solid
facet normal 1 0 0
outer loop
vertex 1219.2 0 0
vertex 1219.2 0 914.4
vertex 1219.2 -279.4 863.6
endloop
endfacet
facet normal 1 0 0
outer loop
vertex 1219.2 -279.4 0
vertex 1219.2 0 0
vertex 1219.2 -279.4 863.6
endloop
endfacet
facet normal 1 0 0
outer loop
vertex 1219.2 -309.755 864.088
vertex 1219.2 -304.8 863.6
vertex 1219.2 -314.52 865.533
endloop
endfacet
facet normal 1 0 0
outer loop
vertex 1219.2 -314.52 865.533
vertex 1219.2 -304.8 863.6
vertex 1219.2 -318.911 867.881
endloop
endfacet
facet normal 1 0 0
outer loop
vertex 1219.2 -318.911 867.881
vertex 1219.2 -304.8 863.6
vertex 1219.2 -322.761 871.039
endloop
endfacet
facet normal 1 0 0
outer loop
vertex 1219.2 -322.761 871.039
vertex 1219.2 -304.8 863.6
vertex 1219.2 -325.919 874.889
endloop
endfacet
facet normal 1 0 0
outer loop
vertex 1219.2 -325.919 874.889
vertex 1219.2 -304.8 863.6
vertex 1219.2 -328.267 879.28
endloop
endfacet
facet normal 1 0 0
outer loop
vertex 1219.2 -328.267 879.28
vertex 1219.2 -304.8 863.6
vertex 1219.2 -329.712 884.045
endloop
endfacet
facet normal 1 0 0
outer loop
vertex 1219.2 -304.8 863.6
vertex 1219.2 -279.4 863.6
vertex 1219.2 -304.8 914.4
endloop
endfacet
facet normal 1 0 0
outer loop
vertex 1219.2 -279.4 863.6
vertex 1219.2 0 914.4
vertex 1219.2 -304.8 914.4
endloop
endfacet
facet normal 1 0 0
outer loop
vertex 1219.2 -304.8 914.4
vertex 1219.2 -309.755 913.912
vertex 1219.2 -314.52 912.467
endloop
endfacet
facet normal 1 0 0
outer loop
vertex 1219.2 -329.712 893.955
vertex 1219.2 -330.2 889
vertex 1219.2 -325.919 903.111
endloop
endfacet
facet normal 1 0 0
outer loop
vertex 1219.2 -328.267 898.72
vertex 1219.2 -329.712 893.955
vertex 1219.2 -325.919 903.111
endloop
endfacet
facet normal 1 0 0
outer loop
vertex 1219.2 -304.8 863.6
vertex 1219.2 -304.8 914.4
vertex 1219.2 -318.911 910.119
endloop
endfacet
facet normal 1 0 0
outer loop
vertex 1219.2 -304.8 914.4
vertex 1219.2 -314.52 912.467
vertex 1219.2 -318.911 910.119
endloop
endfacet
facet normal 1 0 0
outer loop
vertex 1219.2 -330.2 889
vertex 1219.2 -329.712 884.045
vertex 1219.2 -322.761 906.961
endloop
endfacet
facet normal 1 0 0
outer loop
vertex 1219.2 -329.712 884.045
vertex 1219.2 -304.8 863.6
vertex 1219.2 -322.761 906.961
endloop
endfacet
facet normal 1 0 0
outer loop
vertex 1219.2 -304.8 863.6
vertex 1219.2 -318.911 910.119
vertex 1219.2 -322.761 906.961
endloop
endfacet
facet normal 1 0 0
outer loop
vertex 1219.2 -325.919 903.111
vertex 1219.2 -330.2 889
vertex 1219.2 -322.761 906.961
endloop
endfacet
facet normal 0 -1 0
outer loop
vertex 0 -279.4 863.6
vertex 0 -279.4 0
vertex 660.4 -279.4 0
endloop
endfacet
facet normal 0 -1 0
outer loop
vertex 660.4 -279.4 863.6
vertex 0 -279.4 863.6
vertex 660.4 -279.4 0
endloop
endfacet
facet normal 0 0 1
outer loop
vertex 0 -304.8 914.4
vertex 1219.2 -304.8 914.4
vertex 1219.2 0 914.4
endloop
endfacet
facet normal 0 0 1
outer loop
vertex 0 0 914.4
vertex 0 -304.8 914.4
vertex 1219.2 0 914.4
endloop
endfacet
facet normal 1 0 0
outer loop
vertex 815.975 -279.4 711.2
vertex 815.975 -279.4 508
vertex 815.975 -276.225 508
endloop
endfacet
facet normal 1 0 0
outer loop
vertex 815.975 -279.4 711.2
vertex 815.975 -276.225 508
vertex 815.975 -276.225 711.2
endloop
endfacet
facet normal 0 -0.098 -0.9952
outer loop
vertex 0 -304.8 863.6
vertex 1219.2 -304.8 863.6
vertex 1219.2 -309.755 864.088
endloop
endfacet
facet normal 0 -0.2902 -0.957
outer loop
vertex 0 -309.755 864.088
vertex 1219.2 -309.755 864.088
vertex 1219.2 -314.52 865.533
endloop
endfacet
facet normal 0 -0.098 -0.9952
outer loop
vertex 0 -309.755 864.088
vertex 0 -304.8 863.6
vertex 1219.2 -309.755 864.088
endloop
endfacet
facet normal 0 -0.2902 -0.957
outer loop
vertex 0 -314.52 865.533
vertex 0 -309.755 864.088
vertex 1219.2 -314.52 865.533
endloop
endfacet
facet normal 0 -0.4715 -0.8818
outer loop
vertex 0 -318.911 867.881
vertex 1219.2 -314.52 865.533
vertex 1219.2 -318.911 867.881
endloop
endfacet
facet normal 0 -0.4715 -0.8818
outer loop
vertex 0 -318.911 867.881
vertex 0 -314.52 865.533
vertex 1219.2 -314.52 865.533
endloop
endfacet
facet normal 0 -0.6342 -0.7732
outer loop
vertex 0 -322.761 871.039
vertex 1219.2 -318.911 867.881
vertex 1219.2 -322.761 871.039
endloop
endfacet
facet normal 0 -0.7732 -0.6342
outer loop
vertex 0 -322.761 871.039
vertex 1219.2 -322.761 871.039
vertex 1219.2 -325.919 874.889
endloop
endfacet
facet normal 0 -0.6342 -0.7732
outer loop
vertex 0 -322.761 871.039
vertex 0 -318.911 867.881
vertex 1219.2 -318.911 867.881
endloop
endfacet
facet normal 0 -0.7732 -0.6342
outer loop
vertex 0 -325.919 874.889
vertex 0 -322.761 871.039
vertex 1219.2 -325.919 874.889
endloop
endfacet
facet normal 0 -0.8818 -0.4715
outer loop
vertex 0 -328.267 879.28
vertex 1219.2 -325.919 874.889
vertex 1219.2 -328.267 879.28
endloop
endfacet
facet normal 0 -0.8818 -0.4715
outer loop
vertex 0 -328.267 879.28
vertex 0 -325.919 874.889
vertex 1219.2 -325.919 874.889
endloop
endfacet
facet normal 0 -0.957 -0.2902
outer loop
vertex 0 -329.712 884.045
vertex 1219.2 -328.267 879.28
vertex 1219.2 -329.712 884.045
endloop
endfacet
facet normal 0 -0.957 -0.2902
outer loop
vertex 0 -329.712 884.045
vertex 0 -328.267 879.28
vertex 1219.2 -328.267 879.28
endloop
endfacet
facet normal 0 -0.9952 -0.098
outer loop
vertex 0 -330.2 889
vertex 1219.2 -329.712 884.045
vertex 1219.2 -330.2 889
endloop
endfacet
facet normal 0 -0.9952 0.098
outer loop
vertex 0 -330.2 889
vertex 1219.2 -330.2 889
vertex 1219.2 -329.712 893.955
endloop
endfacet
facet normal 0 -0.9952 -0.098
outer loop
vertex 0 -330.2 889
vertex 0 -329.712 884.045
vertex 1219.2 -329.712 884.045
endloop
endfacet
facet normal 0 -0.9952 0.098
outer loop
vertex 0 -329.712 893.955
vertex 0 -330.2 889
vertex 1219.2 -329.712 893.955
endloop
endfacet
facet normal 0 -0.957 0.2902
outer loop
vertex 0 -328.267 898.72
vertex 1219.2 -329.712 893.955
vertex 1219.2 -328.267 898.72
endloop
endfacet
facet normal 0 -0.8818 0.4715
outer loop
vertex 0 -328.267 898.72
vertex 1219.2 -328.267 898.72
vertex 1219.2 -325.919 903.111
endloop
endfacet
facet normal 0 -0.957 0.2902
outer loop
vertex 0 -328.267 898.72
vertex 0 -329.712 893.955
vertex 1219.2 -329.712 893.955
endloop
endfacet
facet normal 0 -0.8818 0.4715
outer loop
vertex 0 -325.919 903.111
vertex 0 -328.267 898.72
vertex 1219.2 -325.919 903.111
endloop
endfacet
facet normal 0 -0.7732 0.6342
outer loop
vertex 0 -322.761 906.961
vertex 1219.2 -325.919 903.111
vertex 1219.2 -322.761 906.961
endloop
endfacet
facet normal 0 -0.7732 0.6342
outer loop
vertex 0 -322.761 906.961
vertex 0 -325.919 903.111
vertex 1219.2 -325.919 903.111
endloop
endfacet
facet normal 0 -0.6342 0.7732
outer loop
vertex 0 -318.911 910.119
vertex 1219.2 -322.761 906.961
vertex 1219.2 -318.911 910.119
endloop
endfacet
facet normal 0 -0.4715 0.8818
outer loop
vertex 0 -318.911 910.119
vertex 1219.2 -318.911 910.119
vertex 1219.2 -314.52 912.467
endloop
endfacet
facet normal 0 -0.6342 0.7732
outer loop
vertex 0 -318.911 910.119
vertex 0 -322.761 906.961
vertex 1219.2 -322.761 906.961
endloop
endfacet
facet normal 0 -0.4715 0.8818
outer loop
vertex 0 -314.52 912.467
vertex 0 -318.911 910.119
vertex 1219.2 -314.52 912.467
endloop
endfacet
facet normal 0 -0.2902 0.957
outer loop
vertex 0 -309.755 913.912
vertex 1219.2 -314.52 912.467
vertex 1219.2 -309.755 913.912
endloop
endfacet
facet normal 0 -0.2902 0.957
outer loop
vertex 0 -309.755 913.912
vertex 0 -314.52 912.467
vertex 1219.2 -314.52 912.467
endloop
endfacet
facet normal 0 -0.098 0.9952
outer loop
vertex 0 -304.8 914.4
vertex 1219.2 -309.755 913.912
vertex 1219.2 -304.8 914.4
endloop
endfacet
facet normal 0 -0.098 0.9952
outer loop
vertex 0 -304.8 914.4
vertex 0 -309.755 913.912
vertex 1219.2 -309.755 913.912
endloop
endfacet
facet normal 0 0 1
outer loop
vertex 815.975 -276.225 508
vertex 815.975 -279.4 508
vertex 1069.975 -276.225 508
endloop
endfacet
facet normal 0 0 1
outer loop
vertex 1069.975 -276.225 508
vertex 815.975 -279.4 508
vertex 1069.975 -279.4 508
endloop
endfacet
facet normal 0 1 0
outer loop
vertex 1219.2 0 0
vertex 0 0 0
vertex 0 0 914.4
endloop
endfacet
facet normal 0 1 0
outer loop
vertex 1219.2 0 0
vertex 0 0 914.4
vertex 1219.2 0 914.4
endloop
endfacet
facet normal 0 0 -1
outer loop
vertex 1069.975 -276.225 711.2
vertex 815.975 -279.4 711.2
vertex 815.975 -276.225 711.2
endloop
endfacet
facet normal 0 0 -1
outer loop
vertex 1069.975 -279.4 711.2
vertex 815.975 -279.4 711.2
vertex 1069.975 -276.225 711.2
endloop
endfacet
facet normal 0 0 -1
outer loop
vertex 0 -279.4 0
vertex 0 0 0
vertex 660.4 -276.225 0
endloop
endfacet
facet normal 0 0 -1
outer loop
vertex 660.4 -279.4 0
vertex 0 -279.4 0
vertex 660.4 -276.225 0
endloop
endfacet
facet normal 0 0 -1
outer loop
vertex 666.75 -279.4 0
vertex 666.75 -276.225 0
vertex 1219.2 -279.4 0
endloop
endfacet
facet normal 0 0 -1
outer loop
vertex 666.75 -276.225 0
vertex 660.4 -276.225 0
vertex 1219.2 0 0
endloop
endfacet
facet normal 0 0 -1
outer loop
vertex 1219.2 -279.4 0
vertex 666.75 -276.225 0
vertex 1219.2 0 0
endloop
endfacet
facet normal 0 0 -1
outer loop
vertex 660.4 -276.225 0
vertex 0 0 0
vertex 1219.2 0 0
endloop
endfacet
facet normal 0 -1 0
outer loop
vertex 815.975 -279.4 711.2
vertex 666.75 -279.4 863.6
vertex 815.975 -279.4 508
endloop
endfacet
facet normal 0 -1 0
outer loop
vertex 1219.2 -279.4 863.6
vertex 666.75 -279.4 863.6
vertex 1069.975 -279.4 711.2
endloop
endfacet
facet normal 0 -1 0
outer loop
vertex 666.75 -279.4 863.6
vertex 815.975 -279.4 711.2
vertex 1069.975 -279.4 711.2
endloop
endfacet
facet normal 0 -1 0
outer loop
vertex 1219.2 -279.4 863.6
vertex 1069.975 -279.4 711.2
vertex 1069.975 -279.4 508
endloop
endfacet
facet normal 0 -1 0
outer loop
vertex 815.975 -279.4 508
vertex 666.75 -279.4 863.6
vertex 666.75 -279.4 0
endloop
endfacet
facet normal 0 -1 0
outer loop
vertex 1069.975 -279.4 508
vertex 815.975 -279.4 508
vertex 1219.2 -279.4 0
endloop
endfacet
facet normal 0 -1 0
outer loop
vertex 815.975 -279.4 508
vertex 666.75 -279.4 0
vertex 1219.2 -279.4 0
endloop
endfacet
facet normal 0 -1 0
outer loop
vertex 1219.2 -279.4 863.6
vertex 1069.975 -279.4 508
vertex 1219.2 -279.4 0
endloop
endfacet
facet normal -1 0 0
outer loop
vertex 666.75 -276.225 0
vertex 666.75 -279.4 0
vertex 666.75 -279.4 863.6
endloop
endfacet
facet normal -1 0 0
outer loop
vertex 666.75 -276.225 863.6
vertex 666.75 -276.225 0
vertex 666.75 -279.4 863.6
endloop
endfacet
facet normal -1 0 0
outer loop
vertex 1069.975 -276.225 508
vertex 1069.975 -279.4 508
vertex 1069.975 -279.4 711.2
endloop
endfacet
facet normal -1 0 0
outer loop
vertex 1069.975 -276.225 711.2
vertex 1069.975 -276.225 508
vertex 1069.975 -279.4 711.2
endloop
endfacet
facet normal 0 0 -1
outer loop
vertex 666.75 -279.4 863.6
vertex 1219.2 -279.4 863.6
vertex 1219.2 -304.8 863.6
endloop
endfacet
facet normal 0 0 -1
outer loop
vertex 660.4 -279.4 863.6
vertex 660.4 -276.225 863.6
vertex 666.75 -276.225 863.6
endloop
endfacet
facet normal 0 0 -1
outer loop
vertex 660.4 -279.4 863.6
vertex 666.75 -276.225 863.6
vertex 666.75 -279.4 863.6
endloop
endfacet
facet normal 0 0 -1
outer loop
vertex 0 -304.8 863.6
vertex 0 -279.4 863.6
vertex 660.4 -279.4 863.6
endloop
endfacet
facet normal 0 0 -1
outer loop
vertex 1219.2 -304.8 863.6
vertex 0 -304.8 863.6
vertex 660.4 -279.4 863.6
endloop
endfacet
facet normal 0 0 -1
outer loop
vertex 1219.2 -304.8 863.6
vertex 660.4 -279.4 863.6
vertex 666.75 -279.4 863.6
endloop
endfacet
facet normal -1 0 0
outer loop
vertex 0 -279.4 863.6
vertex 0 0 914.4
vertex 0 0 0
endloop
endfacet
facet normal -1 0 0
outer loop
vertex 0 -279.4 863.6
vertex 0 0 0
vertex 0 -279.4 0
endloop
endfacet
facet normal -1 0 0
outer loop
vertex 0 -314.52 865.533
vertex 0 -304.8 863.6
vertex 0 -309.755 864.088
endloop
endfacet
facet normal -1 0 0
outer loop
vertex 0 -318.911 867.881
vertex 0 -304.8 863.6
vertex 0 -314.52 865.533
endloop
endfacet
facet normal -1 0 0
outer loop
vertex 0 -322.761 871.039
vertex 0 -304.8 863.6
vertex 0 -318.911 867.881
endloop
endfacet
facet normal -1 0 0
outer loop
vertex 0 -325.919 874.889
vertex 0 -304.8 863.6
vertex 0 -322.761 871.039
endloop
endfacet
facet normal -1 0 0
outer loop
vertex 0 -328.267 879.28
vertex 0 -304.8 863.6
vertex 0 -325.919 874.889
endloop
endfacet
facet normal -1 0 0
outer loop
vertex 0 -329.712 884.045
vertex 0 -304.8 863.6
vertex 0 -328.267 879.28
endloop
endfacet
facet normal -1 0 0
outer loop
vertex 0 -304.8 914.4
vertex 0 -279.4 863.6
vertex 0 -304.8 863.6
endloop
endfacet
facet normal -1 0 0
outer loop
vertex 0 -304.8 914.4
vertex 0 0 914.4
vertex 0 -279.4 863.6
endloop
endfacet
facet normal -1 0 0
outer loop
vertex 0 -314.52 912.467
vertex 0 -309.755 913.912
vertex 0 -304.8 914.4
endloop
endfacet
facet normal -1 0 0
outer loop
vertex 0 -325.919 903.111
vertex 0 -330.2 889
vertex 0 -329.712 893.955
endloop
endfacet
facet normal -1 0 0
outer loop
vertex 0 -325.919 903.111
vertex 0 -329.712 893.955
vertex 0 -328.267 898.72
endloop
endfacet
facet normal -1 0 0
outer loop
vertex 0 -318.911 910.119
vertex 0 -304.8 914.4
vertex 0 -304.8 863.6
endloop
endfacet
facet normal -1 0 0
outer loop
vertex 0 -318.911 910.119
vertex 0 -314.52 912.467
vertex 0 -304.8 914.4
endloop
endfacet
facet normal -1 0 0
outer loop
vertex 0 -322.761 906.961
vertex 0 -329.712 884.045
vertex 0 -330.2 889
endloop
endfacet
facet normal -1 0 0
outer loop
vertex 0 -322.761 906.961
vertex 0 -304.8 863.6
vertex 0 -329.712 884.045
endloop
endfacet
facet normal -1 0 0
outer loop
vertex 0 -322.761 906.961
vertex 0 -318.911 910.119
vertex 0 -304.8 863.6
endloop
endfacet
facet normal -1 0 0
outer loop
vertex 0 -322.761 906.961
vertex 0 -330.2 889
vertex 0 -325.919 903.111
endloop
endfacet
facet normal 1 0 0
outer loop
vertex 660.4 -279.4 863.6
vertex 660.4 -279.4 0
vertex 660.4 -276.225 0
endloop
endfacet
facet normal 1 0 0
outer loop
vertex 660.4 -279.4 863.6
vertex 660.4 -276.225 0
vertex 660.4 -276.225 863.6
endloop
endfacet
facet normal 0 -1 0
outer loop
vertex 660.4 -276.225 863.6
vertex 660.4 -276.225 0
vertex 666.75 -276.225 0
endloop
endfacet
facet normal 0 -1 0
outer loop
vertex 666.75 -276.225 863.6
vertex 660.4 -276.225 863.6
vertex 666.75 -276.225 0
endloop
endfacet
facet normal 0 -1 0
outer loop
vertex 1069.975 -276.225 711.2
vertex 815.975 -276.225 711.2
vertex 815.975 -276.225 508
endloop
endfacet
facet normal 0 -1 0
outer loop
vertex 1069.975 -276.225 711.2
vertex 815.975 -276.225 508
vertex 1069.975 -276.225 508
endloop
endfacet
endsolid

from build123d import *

# Parameters (mm, degrees)
F0_W     = 1219.2
F0_H     = 279.4
F1_DEPTH = 914.4
F3_DEPTH = 1219.2
F4_W     = 6.35
F4_H     = 863.6
F4_W_2   = 254
F4_H_2   = 203.2
F5_DEPTH = 3.175


with BuildPart() as f1:
    # F0 (on Top) → F1 (new body)
    with BuildSketch(Plane.XY):
        with Locations((609.6, -139.7)):
            Rectangle(F0_W, F0_H)
    extrude(amount=F1_DEPTH)

    # F2 (on face) → F3 (join, through all)
    with BuildSketch(Plane(origin=(0, 0, 0), x_dir=(0, -1, 0), z_dir=(-1, 0, 0))):
        with BuildLine():
            Line((304.8, 914.4), (279.4, 914.4))
            Line((279.4, 914.4), (279.4, 863.6))
            Line((279.4, 863.6), (304.8, 863.6))
            ThreePointArc((304.8, 863.6), (330.2, 889), (304.8, 914.4))
        make_face()
    extrude(amount=-F3_DEPTH)

    # F4 (on face) → F5 (cut)
    with BuildSketch(Plane.XZ.offset(279.4)):
        with Locations((663.575, 431.8)):
            Rectangle(F4_W, F4_H)
        with Locations((942.975, 609.6)):
            Rectangle(F4_W_2, F4_H_2)
    extrude(amount=-F5_DEPTH, mode=Mode.SUBTRACT)


solid = f1.part
